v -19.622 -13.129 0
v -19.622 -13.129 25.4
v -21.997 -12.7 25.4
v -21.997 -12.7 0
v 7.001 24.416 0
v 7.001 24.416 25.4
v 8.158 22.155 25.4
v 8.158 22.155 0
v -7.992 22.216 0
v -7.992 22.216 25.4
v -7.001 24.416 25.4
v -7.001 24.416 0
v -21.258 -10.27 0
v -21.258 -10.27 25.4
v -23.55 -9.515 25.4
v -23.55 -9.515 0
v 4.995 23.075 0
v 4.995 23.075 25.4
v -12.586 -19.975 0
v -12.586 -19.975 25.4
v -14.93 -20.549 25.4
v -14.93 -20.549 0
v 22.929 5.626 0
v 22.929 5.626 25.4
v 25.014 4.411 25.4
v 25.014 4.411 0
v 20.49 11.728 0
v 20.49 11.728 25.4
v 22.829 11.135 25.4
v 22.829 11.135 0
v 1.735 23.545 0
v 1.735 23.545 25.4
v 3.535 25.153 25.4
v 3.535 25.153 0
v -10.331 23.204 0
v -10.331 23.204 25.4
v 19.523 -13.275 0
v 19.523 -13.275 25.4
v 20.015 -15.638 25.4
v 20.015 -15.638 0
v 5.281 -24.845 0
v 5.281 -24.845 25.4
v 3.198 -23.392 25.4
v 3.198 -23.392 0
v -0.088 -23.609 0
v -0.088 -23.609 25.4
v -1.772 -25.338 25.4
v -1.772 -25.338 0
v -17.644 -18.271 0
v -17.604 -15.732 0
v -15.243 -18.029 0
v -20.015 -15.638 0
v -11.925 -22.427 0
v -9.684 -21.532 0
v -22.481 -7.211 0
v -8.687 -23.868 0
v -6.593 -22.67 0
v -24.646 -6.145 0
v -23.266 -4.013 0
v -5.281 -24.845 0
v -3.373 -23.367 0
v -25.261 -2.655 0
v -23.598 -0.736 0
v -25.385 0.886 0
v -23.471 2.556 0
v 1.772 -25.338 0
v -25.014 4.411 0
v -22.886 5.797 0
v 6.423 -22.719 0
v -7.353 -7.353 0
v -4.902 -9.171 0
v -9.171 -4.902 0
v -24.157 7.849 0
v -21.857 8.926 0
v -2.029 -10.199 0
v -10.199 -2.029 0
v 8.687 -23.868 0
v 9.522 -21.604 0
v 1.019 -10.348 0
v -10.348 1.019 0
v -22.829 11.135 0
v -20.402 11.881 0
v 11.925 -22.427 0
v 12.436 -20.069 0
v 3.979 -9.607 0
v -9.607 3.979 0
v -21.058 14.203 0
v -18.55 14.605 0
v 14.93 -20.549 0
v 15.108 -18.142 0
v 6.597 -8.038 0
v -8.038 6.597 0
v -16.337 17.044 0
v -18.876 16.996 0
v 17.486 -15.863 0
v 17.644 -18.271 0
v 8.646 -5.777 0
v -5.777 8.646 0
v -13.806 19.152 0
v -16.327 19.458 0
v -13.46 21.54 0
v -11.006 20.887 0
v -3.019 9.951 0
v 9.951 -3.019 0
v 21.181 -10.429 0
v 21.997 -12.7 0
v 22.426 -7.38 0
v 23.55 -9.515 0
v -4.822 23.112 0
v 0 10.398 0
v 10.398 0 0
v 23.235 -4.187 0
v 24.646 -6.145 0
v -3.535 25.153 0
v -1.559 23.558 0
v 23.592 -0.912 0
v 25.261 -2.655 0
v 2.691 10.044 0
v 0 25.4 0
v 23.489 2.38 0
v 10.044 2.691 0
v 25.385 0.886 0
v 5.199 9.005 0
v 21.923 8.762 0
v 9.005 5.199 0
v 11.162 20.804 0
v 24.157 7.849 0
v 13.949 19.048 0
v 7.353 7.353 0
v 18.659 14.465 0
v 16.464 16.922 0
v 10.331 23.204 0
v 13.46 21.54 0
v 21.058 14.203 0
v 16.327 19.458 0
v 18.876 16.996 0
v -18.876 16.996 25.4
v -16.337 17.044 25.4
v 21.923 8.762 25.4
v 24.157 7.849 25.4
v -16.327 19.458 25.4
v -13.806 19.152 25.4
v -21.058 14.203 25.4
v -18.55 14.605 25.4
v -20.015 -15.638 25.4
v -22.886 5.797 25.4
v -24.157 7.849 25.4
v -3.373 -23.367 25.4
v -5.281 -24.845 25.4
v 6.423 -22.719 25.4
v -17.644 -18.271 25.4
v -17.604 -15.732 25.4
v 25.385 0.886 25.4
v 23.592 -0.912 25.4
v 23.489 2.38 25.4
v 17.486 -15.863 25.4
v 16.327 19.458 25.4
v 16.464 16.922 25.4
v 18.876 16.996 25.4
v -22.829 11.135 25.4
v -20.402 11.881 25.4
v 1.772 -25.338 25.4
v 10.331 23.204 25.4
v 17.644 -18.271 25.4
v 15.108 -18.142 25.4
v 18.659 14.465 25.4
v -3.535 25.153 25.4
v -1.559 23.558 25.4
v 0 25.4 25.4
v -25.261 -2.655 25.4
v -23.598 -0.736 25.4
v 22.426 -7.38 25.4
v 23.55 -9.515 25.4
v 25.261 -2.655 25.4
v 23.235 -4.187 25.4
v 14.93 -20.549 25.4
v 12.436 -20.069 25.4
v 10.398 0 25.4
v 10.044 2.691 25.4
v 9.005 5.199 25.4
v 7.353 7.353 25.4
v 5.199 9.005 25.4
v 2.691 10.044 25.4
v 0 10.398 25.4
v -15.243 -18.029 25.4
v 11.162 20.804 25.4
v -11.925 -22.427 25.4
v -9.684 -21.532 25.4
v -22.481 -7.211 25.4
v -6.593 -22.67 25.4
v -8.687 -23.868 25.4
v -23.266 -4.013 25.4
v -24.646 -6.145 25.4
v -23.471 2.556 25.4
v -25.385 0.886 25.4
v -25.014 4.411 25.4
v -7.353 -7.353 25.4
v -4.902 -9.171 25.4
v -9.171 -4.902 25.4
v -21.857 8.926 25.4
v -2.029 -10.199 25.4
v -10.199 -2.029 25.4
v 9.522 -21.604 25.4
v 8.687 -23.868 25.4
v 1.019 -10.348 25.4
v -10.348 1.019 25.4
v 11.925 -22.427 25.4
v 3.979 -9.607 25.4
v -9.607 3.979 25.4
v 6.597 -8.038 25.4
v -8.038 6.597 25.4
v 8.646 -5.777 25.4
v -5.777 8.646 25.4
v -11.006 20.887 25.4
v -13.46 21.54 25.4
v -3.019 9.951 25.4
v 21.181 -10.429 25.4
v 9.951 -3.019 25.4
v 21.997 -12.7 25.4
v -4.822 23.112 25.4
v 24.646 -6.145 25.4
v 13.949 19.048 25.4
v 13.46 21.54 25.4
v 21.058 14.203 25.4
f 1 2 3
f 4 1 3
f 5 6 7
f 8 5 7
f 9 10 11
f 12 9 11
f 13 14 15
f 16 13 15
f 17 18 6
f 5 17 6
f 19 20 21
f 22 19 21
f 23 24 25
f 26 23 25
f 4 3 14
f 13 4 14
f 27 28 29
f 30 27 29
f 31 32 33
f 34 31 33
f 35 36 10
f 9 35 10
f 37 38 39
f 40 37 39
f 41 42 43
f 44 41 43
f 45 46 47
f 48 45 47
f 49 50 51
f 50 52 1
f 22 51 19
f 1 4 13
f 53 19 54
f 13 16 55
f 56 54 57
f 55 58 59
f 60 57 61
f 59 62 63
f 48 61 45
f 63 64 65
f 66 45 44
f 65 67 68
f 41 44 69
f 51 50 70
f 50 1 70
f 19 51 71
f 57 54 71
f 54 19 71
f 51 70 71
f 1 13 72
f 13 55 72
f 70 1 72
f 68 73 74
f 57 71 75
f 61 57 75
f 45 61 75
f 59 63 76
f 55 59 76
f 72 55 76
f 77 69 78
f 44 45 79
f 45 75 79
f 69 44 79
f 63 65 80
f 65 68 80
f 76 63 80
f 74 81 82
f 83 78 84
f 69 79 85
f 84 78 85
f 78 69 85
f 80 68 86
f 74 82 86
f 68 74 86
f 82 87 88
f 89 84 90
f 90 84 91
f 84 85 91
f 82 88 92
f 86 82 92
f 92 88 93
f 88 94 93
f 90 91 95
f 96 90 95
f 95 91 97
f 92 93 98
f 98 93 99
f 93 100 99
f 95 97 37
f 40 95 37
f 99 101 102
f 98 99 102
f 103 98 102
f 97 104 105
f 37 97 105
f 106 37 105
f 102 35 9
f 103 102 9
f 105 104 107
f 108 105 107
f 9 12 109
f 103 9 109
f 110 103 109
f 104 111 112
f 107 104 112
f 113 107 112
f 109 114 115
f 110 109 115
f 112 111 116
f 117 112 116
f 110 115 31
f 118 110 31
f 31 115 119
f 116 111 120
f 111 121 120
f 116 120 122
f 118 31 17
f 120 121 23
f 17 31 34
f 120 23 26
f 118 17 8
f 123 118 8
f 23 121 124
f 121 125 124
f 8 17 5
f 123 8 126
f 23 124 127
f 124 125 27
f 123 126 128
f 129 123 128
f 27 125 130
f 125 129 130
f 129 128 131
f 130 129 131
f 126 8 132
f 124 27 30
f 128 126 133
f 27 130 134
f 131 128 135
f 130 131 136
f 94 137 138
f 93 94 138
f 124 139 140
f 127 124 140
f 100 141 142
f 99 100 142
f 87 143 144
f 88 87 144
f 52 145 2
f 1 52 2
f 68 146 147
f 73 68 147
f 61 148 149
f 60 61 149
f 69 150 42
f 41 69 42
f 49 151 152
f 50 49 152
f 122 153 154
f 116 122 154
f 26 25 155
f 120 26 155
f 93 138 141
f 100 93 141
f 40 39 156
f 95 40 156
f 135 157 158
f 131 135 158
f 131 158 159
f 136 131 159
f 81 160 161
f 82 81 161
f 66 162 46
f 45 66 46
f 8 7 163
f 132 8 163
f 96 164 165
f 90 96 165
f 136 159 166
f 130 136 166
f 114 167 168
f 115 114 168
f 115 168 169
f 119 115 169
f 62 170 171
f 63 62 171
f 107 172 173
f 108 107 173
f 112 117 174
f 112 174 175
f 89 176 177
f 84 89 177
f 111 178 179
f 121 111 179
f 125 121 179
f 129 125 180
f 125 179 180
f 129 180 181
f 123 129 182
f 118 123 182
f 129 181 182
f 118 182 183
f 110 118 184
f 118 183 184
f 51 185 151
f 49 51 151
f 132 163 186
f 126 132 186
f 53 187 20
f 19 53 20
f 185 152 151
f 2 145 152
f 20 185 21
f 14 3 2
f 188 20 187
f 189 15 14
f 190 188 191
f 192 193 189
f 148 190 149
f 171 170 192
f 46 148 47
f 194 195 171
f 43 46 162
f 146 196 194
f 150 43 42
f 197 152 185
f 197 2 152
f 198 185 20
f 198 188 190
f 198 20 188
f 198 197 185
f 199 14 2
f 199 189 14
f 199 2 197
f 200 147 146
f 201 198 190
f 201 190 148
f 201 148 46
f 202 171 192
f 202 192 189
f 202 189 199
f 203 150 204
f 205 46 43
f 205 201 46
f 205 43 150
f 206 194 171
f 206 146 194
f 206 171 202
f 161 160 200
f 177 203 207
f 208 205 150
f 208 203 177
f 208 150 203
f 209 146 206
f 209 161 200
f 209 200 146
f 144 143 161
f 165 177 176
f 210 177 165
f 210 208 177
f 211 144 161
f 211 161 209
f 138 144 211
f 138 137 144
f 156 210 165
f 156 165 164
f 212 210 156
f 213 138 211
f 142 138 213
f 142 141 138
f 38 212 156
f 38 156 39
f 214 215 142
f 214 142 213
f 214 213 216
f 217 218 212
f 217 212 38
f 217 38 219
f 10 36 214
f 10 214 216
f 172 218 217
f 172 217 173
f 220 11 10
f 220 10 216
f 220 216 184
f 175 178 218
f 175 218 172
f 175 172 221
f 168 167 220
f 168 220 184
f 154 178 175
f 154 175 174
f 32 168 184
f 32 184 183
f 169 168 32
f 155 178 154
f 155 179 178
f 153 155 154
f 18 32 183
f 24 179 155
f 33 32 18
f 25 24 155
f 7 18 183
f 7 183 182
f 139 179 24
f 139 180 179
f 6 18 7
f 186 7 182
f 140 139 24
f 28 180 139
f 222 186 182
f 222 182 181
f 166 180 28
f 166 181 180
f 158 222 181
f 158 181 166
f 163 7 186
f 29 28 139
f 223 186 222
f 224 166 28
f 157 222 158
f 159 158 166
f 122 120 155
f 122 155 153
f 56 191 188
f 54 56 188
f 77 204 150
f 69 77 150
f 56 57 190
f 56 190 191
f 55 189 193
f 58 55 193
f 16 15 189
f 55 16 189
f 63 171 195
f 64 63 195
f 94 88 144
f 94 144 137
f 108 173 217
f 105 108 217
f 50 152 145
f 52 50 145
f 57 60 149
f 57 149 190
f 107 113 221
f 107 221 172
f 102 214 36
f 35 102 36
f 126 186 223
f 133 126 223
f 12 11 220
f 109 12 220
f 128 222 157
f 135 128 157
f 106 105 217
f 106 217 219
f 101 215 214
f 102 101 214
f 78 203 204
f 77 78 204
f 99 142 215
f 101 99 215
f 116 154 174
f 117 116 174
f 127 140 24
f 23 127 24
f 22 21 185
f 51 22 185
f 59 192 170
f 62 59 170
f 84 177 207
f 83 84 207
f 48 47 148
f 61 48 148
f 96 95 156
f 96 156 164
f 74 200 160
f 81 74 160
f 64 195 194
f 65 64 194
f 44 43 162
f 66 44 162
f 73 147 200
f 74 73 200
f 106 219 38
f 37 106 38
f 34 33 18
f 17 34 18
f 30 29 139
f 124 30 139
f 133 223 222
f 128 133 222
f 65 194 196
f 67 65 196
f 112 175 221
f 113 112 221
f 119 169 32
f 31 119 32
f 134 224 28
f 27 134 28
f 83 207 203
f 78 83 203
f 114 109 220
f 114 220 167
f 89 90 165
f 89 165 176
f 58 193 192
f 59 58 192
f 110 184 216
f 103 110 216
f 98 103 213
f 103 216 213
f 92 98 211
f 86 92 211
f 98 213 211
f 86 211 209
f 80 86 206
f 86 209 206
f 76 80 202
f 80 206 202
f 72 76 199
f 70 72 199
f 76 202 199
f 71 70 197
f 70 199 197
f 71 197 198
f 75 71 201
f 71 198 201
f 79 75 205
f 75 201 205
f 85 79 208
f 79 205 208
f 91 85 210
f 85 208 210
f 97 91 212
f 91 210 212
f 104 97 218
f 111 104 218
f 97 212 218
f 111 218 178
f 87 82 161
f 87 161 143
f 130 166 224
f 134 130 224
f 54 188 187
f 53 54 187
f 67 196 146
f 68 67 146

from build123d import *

# Parameters (mm, degrees)
F0_R     = 25.4
F1_DEPTH = 25.4
F3_DEPTH = 25.4
F4_DEPTH = 25.4


with BuildPart() as f1:
    # F0 (on Top) → F1 (new body)
    with BuildSketch(Plane.XY):
        Circle(F0_R)
    extrude(amount=F1_DEPTH)

    # F2 (on face) → F3 (cut)
    with BuildSketch(Plane.XY.offset(25.4)):
        with BuildLine():
            Line((-3.3733606068, -23.3670165801), (-5.2809569468, -24.8449490586))
            ThreePointArc((-5.2809569468, -24.8449490586), (-3.5349967644, -25.152808946), (-1.7718144331, -25.3381268766))
            Line((-1.7718144331, -25.3381268766), (-3.3733606068, -23.3670165801))
        make_face()
        with BuildLine():
            Line((-0.0884711356, -23.6090914373), (-1.7718144331, -25.3381268766))
            ThreePointArc((-1.7718144331, -25.3381268766), (0, -25.4), (1.7718144331, -25.3381268766))
            Line((1.7718144331, -25.3381268766), (-0.0884711356, -23.6090914373))
        make_face()
        with BuildLine():
            ThreePointArc((1.7718144331, -25.3381268766), (3.5349967644, -25.152808946), (5.2809569468, -24.8449490586))
            Line((5.2809569468, -24.8449490586), (3.1981403256, -23.3916421847))
            Line((3.1981403256, -23.3916421847), (1.7718144331, -25.3381268766))
        make_face()
        with BuildLine():
            ThreePointArc((5.2809569468, -24.8449490586), (7.0011888378, -24.4160470768), (8.6873116405, -23.868192568))
            Line((8.6873116405, -23.868192568), (6.4225036232, -22.7189012245))
            Line((6.4225036232, -22.7189012245), (5.2809569468, -24.8449490586))
        make_face()
        with BuildLine():
            ThreePointArc((8.6873116405, -23.868192568), (10.3311107341, -23.2040546241), (11.9245776948, -22.4268688586))
            Line((11.9245776948, -22.4268688586), (9.5218601932, -21.6039626944))
            Line((9.5218601932, -21.6039626944), (8.6873116405, -23.868192568))
        make_face()
        with BuildLine():
            ThreePointArc((11.9245776948, -22.4268688586), (13.4599493115, -21.5404216424), (14.9297454082, -20.5490316571))
            Line((14.9297454082, -20.5490316571), (12.4358845856, -20.0685276045))
            Line((12.4358845856, -20.0685276045), (11.9245776948, -22.4268688586))
        make_face()
        with BuildLine():
            ThreePointArc((14.9297454082, -20.5490316571), (16.326805286, -19.4575288552), (17.6443226097, -18.2712309286))
            Line((17.6443226097, -18.2712309286), (15.1078586301, -18.1424814524))
            Line((15.1078586301, -18.1424814524), (14.9297454082, -20.5490316571))
        make_face()
        with BuildLine():
            ThreePointArc((17.6443226097, -18.2712309286), (18.8758785671, -16.9959174015), (20.0154731416, -15.6378014733))
            Line((20.0154731416, -15.6378014733), (17.4857753913, -15.8633125357))
            Line((17.4857753913, -15.8633125357), (17.6443226097, -18.2712309286))
        make_face()
        with BuildLine():
            ThreePointArc((20.0154731416, -15.6378014733), (21.0575543429, -14.2034997482), (21.9970452561, -12.7))
            Line((21.9970452561, -12.7), (19.5233514242, -13.2753822847))
            Line((19.5233514242, -13.2753822847), (20.0154731416, -15.6378014733))
        make_face()
        with BuildLine():
            ThreePointArc((21.9970452561, -12.7), (22.829368776, -11.1346271284), (23.550469906, -9.5150074728))
            Line((23.550469906, -9.5150074728), (21.1809276292, -10.429061818))
            Line((21.1809276292, -10.429061818), (21.9970452561, -12.7))
        make_face()
        with BuildLine():
            ThreePointArc((23.550469906, -9.5150074728), (24.1568355139, -7.8490316571), (24.6455114474, -6.1448161482))
            Line((24.6455114474, -6.1448161482), (22.4262411709, -7.3797515259))
            Line((22.4262411709, -7.3797515259), (23.550469906, -9.5150074728))
        make_face()
        with BuildLine():
            ThreePointArc((24.6455114474, -6.1448161482), (25.0141169265, -4.4106637127), (25.2608561424, -2.655022967))
            Line((25.2608561424, -2.655022967), (23.2350534376, -4.1868027647))
            Line((23.2350534376, -4.1868027647), (24.6455114474, -6.1448161482))
        make_face()
        with BuildLine():
            ThreePointArc((25.4, 0), (25.396131457, 0.4432911235), (25.3845270063, 0.8864472162))
            Line((25.3845270063, 0.8864472162), (23.5916218186, -0.9123626502))
            Line((23.5916218186, -0.9123626502), (25.2608561424, -2.655022967))
            ThreePointArc((25.2608561424, -2.655022967), (25.3651901828, -1.3293332886), (25.4, 0))
        make_face()
        with BuildLine():
            ThreePointArc((25.3845270063, 0.8864472162), (25.2608561424, 2.655022967), (25.0141169265, 4.4106637127))
            Line((25.0141169265, 4.4106637127), (23.489006116, 2.3798355656))
            Line((23.489006116, 2.3798355656), (25.3845270063, 0.8864472162))
        make_face()
        with BuildLine():
            ThreePointArc((25.0141169265, 4.4106637127), (24.6455114474, 6.1448161482), (24.1568355139, 7.8490316571))
            Line((24.1568355139, 7.8490316571), (22.9292036277, 5.6257129891))
            Line((22.9292036277, 5.6257129891), (25.0141169265, 4.4106637127))
        make_face()
        with BuildLine():
            ThreePointArc((24.1568355139, 7.8490316571), (23.550469906, 9.5150074728), (22.829368776, 11.1346271284))
            Line((22.829368776, 11.1346271284), (21.9231102724, 8.7620923084))
            Line((21.9231102724, 8.7620923084), (24.1568355139, 7.8490316571))
        make_face()
        with BuildLine():
            ThreePointArc((22.829368776, 11.1346271284), (21.9970452561, 12.7), (21.0575543429, 14.2034997482))
            Line((21.0575543429, 14.2034997482), (20.4903085128, 11.7279274677))
            Line((20.4903085128, 11.7279274677), (22.829368776, 11.1346271284))
        make_face()
        with BuildLine():
            ThreePointArc((21.0575543429, 14.2034997482), (20.0154731416, 15.6378014733), (18.8758785671, 16.9959174015))
            Line((18.8758785671, 16.9959174015), (18.6586862054, 14.4654918592))
            Line((18.6586862054, 14.4654918592), (21.0575543429, 14.2034997482))
        make_face()
        with BuildLine():
            ThreePointArc((18.8758785671, 16.9959174015), (17.6443226097, 18.2712309286), (16.326805286, 19.4575288552))
            Line((16.326805286, 19.4575288552), (16.4638937949, 16.9215019058))
            Line((16.4638937949, 16.9215019058), (18.8758785671, 16.9959174015))
        make_face()
        with BuildLine():
            ThreePointArc((16.326805286, 19.4575288552), (14.9297454082, 20.5490316571), (13.4599493115, 21.5404216424))
            Line((13.4599493115, 21.5404216424), (13.9486504191, 19.0481541658))
            Line((13.9486504191, 19.0481541658), (16.326805286, 19.4575288552))
        make_face()
        with BuildLine():
            ThreePointArc((13.4599493115, 21.5404216424), (11.9245776948, 22.4268688586), (10.3311107341, 23.2040546241))
            Line((10.3311107341, 23.2040546241), (11.1619124293, 20.8040557719))
            Line((11.1619124293, 20.8040557719), (13.4599493115, 21.5404216424))
        make_face()
        with BuildLine():
            ThreePointArc((10.3311107341, 23.2040546241), (8.6873116405, 23.868192568), (7.0011888378, 24.4160470768))
            Line((7.0011888378, 24.4160470768), (8.1579205105, 22.1550300966))
            Line((8.1579205105, 22.1550300966), (10.3311107341, 23.2040546241))
        make_face()
        with BuildLine():
            ThreePointArc((7.0011888378, 24.4160470768), (5.2809569468, 24.8449490586), (3.5349967644, 25.152808946))
            Line((3.5349967644, 25.152808946), (4.9951439484, 23.0747819615))
            Line((4.9951439484, 23.0747819615), (7.0011888378, 24.4160470768))
        make_face()
        with BuildLine():
            ThreePointArc((3.5349967644, 25.152808946), (1.7718144331, 25.3381268766), (0, 25.4))
            Line((0, 25.4), (1.7351425913, 23.5454094427))
            Line((1.7351425913, 23.5454094427), (3.5349967644, 25.152808946))
        make_face()
        with BuildLine():
            Line((-1.5586313426, 23.5577523116), (0, 25.4))
            ThreePointArc((0, 25.4), (-1.7718144331, 25.3381268766), (-3.5349967644, 25.152808946))
            Line((-3.5349967644, 25.152808946), (-1.5586313426, 23.5577523116))
        make_face()
        with BuildLine():
            Line((-4.8220682904, 23.1115703283), (-3.5349967644, 25.152808946))
            ThreePointArc((-3.5349967644, 25.152808946), (-5.2809569468, 24.8449490586), (-7.0011888378, 24.4160470768))
            Line((-7.0011888378, 24.4160470768), (-4.8220682904, 23.1115703283))
        make_face()
        with BuildLine():
            Line((-7.9916491639, 22.2155479176), (-7.0011888378, 24.4160470768))
            ThreePointArc((-7.0011888378, 24.4160470768), (-8.6873116405, 23.868192568), (-10.3311107341, 23.2040546241))
            Line((-10.3311107341, 23.2040546241), (-7.9916491639, 22.2155479176))
        make_face()
        with BuildLine():
            Line((-11.0056816768, 20.8871251365), (-10.3311107341, 23.2040546241))
            ThreePointArc((-10.3311107341, 23.2040546241), (-11.9245776948, 22.4268688586), (-13.4599493115, 21.5404216424))
            Line((-13.4599493115, 21.5404216424), (-11.0056816768, 20.8871251365))
        make_face()
        with BuildLine():
            Line((-13.8055011147, 19.1521582233), (-13.4599493115, 21.5404216424))
            ThreePointArc((-13.4599493115, 21.5404216424), (-14.9297454082, 20.5490316571), (-16.326805286, 19.4575288552))
            Line((-16.326805286, 19.4575288552), (-13.8055011147, 19.1521582233))
        make_face()
        with BuildLine():
            Line((-16.3366121768, 17.0444163356), (-16.326805286, 19.4575288552))
            ThreePointArc((-16.326805286, 19.4575288552), (-17.6443226097, 18.2712309286), (-18.8758785671, 16.9959174015))
            Line((-18.8758785671, 16.9959174015), (-16.3366121768, 17.0444163356))
        make_face()
        with BuildLine():
            Line((-18.5497496656, 14.6049242717), (-18.8758785671, 16.9959174015))
            ThreePointArc((-18.8758785671, 16.9959174015), (-20.0154731416, 15.6378014733), (-21.0575543429, 14.2034997482))
            Line((-21.0575543429, 14.2034997482), (-18.5497496656, 14.6049242717))
        make_face()
        with BuildLine():
            Line((-20.4018373772, 11.8811639696), (-21.0575543429, 14.2034997482))
            ThreePointArc((-21.0575543429, 14.2034997482), (-21.9970452561, 12.7), (-22.829368776, 11.1346271284))
            Line((-22.829368776, 11.1346271284), (-20.4018373772, 11.8811639696))
        make_face()
        with BuildLine():
            Line((-21.856826531, 8.9261503255), (-22.829368776, 11.1346271284))
            ThreePointArc((-22.829368776, 11.1346271284), (-23.550469906, 9.5150074728), (-24.1568355139, 7.8490316571))
            Line((-24.1568355139, 7.8490316571), (-21.856826531, 8.9261503255))
        make_face()
        with BuildLine():
            Line((-22.8863974181, 5.7973993187), (-24.1568355139, 7.8490316571))
            ThreePointArc((-24.1568355139, 7.8490316571), (-24.6455114474, 6.1448161482), (-25.0141169265, 4.4106637127))
            Line((-25.0141169265, 4.4106637127), (-22.8863974181, 5.7973993187))
        make_face()
        with BuildLine():
            Line((-23.4705106123, 2.5558085286), (-25.0141169265, 4.4106637127))
            ThreePointArc((-25.0141169265, 4.4106637127), (-25.2608561424, 2.655022967), (-25.3845270063, 0.8864472162))
            Line((-25.3845270063, 0.8864472162), (-23.4705106123, 2.5558085286))
        make_face()
        with BuildLine():
            Line((-23.5977970148, -0.7355281674), (-25.3845270063, 0.8864472162))
            ThreePointArc((-25.3845270063, 0.8864472162), (-25.3845270063, -0.8864472162), (-25.2608561424, -2.655022967))
            Line((-25.2608561424, -2.655022967), (-23.5977970148, -0.7355281674))
        make_face()
        with BuildLine():
            Line((-23.2657791405, -4.0125486442), (-25.2608561424, -2.655022967))
            ThreePointArc((-25.2608561424, -2.655022967), (-25.0141169265, -4.4106637127), (-24.6455114474, -6.1448161482))
            Line((-24.6455114474, -6.1448161482), (-23.2657791405, -4.0125486442))
        make_face()
        with BuildLine():
            Line((-22.4809193397, -7.2114694259), (-24.6455114474, -6.1448161482))
            ThreePointArc((-24.6455114474, -6.1448161482), (-24.1568355139, -7.8490316571), (-23.550469906, -9.5150074728))
            Line((-23.550469906, -9.5150074728), (-22.4809193397, -7.2114694259))
        make_face()
        with BuildLine():
            Line((-21.2584940156, -10.2700271581), (-23.550469906, -9.5150074728))
            ThreePointArc((-23.550469906, -9.5150074728), (-22.829368776, -11.1346271284), (-21.9970452561, -12.7))
            Line((-21.9970452561, -12.7), (-21.2584940156, -10.2700271581))
        make_face()
        with BuildLine():
            Line((-19.6222962866, -13.1286904936), (-21.9970452561, -12.7))
            ThreePointArc((-21.9970452561, -12.7), (-21.0575543429, -14.2034997482), (-20.0154731416, -15.6378014733))
            Line((-20.0154731416, -15.6378014733), (-19.6222962866, -13.1286904936))
        make_face()
        with BuildLine():
            Line((-17.6041728805, -15.7318188024), (-20.0154731416, -15.6378014733))
            ThreePointArc((-20.0154731416, -15.6378014733), (-18.8758785671, -16.9959174015), (-17.6443226097, -18.2712309286))
            Line((-17.6443226097, -18.2712309286), (-17.6041728805, -15.7318188024))
        make_face()
        with BuildLine():
            Line((-15.2434042737, -18.0287451529), (-17.6443226097, -18.2712309286))
            ThreePointArc((-17.6443226097, -18.2712309286), (-16.326805286, -19.4575288552), (-14.9297454082, -20.5490316571))
            Line((-14.9297454082, -20.5490316571), (-15.2434042737, -18.0287451529))
        make_face()
        with BuildLine():
            Line((-12.5859401418, -19.9747624863), (-14.9297454082, -20.5490316571))
            ThreePointArc((-14.9297454082, -20.5490316571), (-13.4599493115, -21.5404216424), (-11.9245776948, -22.4268688586))
            Line((-11.9245776948, -22.4268688586), (-12.5859401418, -19.9747624863))
        make_face()
        with BuildLine():
            Line((-9.6835050014, -21.5319937889), (-11.9245776948, -22.4268688586))
            ThreePointArc((-11.9245776948, -22.4268688586), (-10.3311107341, -23.2040546241), (-8.6873116405, -23.868192568))
            Line((-8.6873116405, -23.868192568), (-9.6835050014, -21.5319937889))
        make_face()
        with BuildLine():
            Line((-6.5925914509, -22.6701293247), (-8.6873116405, -23.868192568))
            ThreePointArc((-8.6873116405, -23.868192568), (-7.0011888378, -24.4160470768), (-5.2809569468, -24.8449490586))
            Line((-5.2809569468, -24.8449490586), (-6.5925914509, -22.6701293247))
        make_face()
    extrude(amount=-F3_DEPTH, mode=Mode.SUBTRACT)

    # F2 (on face) → F4 (cut)
    with BuildSketch(Plane.XY.offset(25.4)):
        with BuildLine():
            ThreePointArc((10.3984196314, 0), (7.352793035, 7.352793035), (0, 10.3984196314))
            ThreePointArc((0, 10.3984196314), (-7.352793035, -7.352793035), (10.3984196314, 0))
        make_face()
    extrude(amount=-F4_DEPTH, mode=Mode.SUBTRACT)


solid = f1.part
